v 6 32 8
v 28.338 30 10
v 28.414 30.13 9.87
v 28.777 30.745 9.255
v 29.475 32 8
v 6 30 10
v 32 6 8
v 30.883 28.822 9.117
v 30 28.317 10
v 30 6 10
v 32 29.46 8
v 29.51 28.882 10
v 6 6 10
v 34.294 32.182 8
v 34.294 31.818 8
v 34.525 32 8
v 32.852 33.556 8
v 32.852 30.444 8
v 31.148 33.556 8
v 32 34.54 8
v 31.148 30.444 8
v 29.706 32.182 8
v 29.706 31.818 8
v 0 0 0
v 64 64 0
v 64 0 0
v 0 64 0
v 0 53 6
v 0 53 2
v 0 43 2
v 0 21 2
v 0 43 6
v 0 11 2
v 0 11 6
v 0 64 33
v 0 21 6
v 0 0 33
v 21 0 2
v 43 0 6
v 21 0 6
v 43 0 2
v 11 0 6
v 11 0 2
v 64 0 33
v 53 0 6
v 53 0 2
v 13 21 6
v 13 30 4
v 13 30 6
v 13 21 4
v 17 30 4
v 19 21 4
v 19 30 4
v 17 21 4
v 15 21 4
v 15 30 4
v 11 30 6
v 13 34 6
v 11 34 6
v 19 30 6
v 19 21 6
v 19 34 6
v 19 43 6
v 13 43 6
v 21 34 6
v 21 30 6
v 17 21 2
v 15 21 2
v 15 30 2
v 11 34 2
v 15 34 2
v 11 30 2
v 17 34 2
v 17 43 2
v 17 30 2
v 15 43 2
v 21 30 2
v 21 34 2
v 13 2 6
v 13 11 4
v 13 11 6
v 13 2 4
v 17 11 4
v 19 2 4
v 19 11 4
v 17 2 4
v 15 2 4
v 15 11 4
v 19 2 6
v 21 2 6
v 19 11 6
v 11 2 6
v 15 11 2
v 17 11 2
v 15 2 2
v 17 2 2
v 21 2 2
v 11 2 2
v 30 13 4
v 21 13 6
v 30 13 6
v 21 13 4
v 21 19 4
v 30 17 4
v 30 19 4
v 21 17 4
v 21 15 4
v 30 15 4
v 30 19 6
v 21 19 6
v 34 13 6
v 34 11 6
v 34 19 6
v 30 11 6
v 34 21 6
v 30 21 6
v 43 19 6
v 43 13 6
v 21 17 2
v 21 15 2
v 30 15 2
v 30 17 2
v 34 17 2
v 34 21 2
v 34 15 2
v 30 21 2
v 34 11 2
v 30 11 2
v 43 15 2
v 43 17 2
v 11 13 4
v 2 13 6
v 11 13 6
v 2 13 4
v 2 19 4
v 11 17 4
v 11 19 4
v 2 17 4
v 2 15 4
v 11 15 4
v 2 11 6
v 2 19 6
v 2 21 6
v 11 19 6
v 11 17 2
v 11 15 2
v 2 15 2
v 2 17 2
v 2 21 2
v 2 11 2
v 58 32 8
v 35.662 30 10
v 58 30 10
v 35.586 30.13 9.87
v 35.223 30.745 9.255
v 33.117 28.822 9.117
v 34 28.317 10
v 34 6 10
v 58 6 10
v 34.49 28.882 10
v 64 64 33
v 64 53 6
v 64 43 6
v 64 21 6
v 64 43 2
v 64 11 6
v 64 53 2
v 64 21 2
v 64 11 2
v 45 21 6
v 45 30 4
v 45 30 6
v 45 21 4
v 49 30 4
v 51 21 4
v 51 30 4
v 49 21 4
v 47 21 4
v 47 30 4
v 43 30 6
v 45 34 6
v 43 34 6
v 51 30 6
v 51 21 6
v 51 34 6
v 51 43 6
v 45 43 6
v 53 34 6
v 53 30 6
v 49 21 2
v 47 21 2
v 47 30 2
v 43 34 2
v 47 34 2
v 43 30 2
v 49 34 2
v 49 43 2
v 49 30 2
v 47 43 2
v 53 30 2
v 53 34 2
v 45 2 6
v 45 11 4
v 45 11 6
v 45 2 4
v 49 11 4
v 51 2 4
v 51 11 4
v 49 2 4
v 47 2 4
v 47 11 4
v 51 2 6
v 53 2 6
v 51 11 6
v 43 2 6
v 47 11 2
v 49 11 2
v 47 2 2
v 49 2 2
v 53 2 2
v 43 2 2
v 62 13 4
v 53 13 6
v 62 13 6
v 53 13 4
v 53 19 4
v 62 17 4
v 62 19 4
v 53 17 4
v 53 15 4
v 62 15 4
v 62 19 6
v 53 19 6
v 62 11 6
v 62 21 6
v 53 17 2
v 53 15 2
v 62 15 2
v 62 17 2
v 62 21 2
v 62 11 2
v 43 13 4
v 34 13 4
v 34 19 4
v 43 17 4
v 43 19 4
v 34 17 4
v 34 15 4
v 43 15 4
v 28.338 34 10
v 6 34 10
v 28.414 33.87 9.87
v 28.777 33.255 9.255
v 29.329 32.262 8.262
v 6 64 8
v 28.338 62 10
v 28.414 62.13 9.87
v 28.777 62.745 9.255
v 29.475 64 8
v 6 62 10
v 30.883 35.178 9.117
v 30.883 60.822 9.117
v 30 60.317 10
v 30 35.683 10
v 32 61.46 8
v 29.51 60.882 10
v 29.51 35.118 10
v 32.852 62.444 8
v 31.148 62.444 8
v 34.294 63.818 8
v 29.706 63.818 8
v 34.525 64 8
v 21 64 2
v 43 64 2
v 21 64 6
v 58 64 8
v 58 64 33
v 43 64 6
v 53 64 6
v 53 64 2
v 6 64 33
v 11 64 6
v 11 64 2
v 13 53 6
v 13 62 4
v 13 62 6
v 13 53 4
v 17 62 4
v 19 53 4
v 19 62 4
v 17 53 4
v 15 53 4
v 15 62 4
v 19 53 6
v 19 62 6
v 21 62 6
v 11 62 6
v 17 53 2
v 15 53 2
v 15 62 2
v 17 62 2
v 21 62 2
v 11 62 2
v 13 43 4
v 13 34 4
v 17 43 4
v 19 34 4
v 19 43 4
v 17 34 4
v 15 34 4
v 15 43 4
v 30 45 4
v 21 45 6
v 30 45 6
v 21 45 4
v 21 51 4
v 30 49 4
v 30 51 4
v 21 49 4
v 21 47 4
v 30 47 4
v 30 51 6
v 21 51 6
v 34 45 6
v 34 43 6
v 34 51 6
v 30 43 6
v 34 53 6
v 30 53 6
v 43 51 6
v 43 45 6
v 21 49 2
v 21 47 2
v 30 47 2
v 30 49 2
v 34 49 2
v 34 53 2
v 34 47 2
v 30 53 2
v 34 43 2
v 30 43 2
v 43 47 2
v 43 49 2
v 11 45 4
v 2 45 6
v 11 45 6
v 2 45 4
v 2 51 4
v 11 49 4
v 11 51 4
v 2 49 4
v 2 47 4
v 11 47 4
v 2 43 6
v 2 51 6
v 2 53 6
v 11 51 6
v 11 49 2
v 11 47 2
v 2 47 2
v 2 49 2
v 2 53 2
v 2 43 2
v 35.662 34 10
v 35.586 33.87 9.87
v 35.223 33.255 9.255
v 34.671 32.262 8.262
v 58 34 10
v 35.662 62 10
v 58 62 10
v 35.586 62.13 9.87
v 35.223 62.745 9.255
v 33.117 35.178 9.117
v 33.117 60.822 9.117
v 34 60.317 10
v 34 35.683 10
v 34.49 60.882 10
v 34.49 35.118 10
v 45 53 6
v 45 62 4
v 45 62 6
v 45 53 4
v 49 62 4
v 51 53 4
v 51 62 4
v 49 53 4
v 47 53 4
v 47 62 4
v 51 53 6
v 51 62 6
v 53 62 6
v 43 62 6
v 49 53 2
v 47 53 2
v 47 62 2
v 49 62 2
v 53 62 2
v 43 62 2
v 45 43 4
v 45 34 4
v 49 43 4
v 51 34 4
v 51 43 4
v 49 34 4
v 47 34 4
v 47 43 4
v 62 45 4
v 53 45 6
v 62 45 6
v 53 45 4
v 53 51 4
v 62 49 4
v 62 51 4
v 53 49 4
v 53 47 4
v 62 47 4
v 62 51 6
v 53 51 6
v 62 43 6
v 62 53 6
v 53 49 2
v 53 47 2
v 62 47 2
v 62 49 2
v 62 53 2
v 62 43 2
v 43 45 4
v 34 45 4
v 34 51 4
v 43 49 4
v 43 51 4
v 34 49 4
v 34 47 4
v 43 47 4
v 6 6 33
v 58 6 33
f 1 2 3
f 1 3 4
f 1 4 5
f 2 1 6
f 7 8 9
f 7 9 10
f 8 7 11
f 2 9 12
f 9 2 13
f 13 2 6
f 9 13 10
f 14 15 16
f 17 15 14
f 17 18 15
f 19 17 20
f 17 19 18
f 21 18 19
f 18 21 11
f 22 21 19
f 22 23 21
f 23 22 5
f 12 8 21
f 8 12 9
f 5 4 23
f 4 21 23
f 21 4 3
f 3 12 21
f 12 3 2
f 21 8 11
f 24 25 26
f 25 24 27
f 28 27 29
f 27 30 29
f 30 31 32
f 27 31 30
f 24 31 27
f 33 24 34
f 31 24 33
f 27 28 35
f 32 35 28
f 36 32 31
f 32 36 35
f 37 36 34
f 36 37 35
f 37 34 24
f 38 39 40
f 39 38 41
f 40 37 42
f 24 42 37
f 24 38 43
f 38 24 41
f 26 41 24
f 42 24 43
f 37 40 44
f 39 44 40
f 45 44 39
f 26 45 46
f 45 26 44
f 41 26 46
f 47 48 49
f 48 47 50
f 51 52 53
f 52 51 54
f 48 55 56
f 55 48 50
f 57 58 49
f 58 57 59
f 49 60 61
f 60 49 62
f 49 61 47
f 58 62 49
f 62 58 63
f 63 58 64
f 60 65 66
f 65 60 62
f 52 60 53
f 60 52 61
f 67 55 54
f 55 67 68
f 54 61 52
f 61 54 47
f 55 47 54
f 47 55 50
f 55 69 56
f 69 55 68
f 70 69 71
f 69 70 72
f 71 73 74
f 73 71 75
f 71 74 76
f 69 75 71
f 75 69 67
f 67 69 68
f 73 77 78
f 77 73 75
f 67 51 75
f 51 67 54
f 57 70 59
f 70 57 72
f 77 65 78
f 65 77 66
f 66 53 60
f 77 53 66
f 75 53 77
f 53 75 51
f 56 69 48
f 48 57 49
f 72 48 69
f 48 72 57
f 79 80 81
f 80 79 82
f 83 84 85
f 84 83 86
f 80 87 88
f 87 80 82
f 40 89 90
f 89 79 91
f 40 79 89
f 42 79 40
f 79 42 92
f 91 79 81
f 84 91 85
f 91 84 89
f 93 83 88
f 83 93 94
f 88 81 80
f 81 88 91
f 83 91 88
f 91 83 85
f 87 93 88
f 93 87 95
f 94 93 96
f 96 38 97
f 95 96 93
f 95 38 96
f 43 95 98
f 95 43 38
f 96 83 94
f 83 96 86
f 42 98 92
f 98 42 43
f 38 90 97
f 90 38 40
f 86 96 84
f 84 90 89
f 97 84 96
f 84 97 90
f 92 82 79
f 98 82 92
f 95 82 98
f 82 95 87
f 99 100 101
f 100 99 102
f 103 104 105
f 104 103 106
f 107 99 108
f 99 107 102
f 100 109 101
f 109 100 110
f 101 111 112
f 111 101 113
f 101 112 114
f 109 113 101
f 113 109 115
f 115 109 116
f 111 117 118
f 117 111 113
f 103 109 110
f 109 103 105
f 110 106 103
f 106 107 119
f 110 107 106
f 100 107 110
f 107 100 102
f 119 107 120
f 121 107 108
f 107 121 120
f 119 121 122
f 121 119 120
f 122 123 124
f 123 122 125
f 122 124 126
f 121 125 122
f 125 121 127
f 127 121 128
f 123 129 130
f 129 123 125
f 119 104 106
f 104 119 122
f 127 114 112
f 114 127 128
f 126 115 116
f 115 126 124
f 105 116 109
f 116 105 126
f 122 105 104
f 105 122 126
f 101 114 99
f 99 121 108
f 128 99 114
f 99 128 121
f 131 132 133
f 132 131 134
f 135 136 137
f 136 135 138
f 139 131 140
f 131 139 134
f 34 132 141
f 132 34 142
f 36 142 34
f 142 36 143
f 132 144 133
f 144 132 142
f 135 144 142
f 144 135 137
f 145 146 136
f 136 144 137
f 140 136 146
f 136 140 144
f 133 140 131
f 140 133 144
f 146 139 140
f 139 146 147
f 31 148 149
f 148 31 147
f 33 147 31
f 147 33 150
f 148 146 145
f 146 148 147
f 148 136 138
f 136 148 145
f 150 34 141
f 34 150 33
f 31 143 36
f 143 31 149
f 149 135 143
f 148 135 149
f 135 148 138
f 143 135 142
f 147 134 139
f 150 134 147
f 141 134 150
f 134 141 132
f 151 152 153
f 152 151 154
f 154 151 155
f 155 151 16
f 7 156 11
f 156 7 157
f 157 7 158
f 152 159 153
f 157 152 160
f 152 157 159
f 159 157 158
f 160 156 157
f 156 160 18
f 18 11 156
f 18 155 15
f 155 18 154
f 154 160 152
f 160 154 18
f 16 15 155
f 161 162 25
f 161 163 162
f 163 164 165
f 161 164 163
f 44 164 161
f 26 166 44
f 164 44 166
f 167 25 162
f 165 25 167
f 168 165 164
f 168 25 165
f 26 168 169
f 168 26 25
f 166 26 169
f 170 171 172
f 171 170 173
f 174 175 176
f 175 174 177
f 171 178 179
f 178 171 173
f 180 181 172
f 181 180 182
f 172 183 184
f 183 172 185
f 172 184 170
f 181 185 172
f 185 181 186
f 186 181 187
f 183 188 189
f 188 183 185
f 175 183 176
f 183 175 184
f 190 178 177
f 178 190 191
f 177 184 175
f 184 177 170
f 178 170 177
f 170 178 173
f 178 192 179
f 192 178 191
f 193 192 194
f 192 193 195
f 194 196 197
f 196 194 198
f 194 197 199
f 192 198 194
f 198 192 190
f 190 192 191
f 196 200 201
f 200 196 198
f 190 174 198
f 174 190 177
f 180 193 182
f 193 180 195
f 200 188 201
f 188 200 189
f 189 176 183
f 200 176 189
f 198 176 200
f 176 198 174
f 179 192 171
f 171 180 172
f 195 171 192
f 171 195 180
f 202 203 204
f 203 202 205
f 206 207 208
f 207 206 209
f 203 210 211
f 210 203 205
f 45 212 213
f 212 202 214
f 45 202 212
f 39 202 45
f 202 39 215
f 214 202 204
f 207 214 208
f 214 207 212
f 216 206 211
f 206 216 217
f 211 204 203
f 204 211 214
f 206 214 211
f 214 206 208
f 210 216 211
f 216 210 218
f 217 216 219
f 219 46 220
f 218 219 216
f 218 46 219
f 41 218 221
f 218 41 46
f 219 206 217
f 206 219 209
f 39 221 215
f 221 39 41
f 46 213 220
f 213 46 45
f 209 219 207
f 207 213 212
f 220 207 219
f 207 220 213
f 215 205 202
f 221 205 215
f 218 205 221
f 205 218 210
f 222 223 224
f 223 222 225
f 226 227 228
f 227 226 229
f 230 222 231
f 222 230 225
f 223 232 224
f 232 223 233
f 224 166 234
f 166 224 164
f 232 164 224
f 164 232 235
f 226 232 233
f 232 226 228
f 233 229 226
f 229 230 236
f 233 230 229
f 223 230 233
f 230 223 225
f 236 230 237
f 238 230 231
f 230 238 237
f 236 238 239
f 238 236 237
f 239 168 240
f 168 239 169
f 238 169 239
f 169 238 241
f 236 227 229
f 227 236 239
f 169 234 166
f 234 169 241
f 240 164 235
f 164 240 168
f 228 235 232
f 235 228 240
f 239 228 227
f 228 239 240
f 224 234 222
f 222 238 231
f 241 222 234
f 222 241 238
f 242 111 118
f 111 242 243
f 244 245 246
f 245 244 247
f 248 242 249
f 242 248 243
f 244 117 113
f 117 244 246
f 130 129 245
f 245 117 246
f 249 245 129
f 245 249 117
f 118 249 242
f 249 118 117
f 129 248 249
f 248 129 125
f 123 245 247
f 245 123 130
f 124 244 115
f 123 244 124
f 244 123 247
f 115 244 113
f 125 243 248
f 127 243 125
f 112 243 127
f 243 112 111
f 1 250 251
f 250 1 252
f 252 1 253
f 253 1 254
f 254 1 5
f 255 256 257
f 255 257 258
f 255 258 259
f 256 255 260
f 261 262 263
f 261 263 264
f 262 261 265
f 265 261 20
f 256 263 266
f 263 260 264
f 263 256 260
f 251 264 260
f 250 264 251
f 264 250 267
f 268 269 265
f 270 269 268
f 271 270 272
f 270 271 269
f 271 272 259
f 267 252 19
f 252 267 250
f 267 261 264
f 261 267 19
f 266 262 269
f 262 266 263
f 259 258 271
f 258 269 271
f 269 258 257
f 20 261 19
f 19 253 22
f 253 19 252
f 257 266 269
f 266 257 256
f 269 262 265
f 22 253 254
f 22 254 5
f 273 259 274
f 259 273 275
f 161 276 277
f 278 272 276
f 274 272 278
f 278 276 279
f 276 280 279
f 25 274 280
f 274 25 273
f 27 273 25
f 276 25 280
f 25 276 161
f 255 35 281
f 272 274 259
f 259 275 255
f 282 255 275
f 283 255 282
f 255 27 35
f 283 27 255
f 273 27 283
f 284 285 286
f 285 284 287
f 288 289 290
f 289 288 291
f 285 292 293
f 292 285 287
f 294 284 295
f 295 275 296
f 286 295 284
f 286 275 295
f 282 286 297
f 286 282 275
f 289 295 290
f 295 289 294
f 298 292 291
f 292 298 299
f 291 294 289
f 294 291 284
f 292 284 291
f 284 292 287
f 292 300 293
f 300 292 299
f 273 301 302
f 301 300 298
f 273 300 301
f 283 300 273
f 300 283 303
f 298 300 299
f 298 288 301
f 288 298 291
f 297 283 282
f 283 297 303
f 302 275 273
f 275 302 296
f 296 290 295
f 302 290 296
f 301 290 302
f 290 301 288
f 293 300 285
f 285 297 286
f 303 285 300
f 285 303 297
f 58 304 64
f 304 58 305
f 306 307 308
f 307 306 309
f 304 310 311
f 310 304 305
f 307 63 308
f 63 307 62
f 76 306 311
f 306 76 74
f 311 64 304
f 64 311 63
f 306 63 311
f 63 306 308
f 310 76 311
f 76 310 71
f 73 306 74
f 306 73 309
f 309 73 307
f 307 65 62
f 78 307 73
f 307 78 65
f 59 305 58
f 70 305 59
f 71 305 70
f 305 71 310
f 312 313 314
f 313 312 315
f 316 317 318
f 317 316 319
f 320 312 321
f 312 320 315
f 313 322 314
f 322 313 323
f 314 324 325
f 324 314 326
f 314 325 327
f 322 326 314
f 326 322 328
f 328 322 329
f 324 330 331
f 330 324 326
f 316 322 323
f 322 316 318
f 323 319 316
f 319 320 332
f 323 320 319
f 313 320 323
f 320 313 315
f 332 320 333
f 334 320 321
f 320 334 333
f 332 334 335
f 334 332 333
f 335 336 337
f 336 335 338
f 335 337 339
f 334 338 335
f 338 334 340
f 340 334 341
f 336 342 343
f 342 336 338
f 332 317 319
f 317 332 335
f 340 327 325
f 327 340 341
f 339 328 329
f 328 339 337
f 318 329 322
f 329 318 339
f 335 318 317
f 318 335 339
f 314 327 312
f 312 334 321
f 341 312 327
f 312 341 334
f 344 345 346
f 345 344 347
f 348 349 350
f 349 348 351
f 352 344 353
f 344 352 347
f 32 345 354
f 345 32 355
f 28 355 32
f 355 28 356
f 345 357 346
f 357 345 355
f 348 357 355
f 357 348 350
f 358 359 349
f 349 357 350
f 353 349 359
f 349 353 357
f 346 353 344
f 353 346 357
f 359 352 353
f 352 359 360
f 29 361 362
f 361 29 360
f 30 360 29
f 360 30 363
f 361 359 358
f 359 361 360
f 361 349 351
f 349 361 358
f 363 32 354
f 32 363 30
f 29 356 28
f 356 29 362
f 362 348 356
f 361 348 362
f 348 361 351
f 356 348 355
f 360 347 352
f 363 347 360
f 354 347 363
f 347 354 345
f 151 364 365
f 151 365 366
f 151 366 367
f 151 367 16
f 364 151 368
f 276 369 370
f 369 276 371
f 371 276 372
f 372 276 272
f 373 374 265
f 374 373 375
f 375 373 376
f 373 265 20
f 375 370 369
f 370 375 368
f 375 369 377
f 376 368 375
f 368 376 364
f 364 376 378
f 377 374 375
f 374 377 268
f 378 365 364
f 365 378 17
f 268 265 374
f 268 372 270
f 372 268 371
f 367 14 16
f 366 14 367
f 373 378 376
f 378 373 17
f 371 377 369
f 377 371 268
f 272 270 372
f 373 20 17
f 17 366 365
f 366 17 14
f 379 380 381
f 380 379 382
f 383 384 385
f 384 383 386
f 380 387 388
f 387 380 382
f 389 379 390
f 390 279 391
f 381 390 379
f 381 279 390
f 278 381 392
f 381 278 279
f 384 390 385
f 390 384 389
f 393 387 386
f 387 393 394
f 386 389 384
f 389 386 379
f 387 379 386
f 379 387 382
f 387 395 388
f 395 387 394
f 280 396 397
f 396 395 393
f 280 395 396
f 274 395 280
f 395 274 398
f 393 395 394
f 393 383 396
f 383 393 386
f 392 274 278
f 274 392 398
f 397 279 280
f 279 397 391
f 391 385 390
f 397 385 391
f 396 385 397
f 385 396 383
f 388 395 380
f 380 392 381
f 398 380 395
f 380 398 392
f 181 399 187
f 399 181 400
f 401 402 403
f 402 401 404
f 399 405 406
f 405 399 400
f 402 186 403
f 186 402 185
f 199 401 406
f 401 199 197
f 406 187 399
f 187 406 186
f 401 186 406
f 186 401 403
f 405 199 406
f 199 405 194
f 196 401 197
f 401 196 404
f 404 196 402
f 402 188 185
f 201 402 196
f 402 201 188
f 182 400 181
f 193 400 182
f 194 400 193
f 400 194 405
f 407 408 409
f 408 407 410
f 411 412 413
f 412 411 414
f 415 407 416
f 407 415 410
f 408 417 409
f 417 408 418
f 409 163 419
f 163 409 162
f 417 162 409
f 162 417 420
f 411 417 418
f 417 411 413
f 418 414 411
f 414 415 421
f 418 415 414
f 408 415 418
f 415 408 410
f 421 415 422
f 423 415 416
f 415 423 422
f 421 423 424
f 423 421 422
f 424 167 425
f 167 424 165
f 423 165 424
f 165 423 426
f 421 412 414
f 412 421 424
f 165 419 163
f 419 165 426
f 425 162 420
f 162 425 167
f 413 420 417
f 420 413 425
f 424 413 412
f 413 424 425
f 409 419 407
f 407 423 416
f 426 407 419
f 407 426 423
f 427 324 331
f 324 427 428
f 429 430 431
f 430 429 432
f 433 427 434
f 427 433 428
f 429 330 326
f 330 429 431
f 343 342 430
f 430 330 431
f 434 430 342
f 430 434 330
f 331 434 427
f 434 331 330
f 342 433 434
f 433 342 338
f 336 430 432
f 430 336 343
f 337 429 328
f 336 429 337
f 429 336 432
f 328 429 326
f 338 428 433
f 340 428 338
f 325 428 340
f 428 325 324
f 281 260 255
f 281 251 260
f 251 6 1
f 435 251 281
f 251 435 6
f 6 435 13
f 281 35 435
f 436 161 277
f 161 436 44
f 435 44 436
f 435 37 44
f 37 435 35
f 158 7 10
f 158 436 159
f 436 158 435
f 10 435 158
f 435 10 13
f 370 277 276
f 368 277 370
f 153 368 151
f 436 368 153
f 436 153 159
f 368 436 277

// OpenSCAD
// file: ModularDungeonTileLibrary.scad
//Constants
wallleft = 0;
wallbottom = 1;
wallright = 2;
walltop = 3;
wallcenter = 4;
walldoubleright = 5;


//Variables
size = 32;
connectorlength = size-10;
connectorwidth = 6;
connectorheight = 4;
baseheight = 8;
topperheight = 2;
topperrounded = true;
walllength = size;
wallheight = 25;
wallwidth = 6;
wallwidththin = 4;


//Functions
function hypotenuse_ra(side_a, side_b) =
    sqrt(pow(side_a, 2) + pow(side_b, 2));
    
    
//Modules    
module mtdl_Base_Connector(cw,cl,ch) {
    translate([-connectorwidth/2,-connectorlength/2,-connectorheight/2]) {
        cube([cw,cl,ch/2]);
        translate([cw/3,0,ch/2])
            cube([cw/3,cl,ch/2]);
        translate([-(cw-2)/2,cl/2-2,0])
            cube([cw+4,4,ch]);
    }
}

module mdtl_Base(s,bh)
{
    cube([s,s,bh]);
}

module mdtl_Topper(s,bh,th,tr)
{
    if (tr) {
        translate([0,0,bh])
            intersection() {
                difference () {
                        cube([s,s,th]);
                        union () {
                        rotate(a=45, v=[1,0,0])
                            cube([s,th*2,th*2]);
                        translate([0,s,0])
                            rotate(a=45, v=[1,0,0])
                                cube([s,th*2,th*2]);
                        rotate(a=-45, v=[0,1,0])
                            cube([th*2,s,th*2]);
                        translate([s,0,0])
                            rotate(a=-45, v=[0,1,0])
                                cube([th*2,s,th*2]);
                        }
                }
                translate([s/2,s/2,0])
                    cylinder(
                        h=th, 
                        r1=hypotenuse_ra(s/2-1.2, s/2-1.2), 
                        r2=hypotenuse_ra(s/2-th-.8, s/2-th-.8), 
                        center=false, 
                        $fa=.1);
            }    
    }
    else {
        translate([0,0,bh])
            difference() {
                cube([s,s,th]);
                union () {
                rotate(a=45, v=[1,0,0])
                    cube([s,th*2,th*2]);
                translate([0,s,0])
                    rotate(a=45, v=[1,0,0])
                        cube([s,th*2,th*2]);
                rotate(a=-45, v=[0,1,0])
                    cube([th*2,s,th*2]);
                translate([s,0,0])
                    rotate(a=-45, v=[0,1,0])
                        cube([th*2,s,th*2]);
                }
            }    
    }
}

module mdtl_Base_1x1(s,bh,th,tr) 
{
    difference () {
        union () {
            mdtl_Base(s,bh);
            mdtl_Topper(s,bh,th,tr);
        }
        union () {
            translate([size/2,size,baseheight/2])
                rotate([0,180,0])
                    mtdl_Base_Connector(connectorwidth,connectorlength,connectorheight);
            translate([size/2,0,baseheight/2])
                rotate([0,180,0])
                    mtdl_Base_Connector(connectorwidth,connectorlength,connectorheight);
            translate([size,size/2,baseheight/2])
                rotate([0,180,90])
                    mtdl_Base_Connector(connectorwidth,connectorlength,connectorheight);
            translate([0,size/2,baseheight/2])
                rotate([0,180,90])
                    mtdl_Base_Connector(connectorwidth,connectorlength,connectorheight);
        }
    }
}

module mdtl_Base_1x2(s,bh,th,tr)
{
    union () {
        mdtl_Base_1x1(s,bh,th,tr);
        translate([s,0,0])
            mdtl_Base_1x1(s,bh,th,tr);
    }
}
 
module mdtl_Base_2x2(s,bh,th,tr)
{
    union () {
        mdtl_Base_1x2(s,bh,th,tr);
        translate([0,s,0])
            mdtl_Base_1x2(s,bh,th,tr);
    }
}
 
module mdtl_Base_2x4(s,bh,th,tr)
{
    union () {
        mdtl_Base_2x2(s,bh,th,tr);
        translate([s*2,0,0])
            mdtl_Base_2x2(s,bh,th,tr);
    }
}
 
module mdtl_Base_4x4(s,bh,th,tr)
{
    union () {
        mdtl_Base_2x4(s,bh,th,tr);
        translate([0,s*2,0])
            mdtl_Base_2x4(s,bh,th,tr);
    }
}
 
module mdtl_Wall_1(w,l,h)
{
    translate([0,0,baseheight])
        cube([w,l,h]);   
}

module mdtl_Wall_1_Position(w,l,h,p)
{
    if (p==0) {
        mdtl_Wall_1(w,l,h);
    }
    
    else if (p==1) {
        rotate(a=-90)
           translate([-w,0,0])
               mdtl_Wall_1(w,l,h);       
    }
    
    else if (p==2) {
        translate([(size)-w,0,0])
            mdtl_Wall_1(w,l,h);
    }
    
    else if (p==3) {
        rotate(a=-90)
            translate([-l,0,0])
                mdtl_Wall_1(w,l,h);
    }
    
    else if (p==4) {
        translate([(size)-w/2,0,0])
            mdtl_Wall_1(w,l,h);
    }
    
    else if (p==5) {
        translate([(size*2)-w,0,0])
           mdtl_Wall_1(w,l,h);       
    }
}

module mdtl_Wall_2(w,l,h)
{
    union() {
        mdtl_Wall_1(w,l,h);
        translate([0,l,0])
            mdtl_Wall_1(w,l,h);
    }
}

module mdtl_Wall_2_Position(w,l,h,p)
{
    if (p==0) {
        mdtl_Wall_2(w,l,h);
    }
    
    else if (p==1) {
        rotate(a=-90)
            translate([-w,0,0])
                mdtl_Wall_2(w,l,h);
    }
    
    else if (p==2) {
    translate([(size*2)-w,0,0])
        mdtl_Wall_2(w,l,h);
    }
    
    else if (p==3) {
        rotate(a=-90)
            translate([-l*2,0,0])
                mdtl_Wall_2(w,l,h);
    }
    
    else if (p==4) {
        translate([(size)-w/2,0,0])
            mdtl_Wall_2(w,l,h);
    }
}
// main file
include <ModularDungeonTileLibrary.scad>; 
 
mdtl_Base_2x2(size,baseheight,topperheight,topperrounded);
mdtl_Wall_2_Position(wallwidth,walllength,wallheight,wallleft);
mdtl_Wall_2_Position(wallwidth,walllength,wallheight,wallbottom);
mdtl_Wall_2_Position(wallwidth,walllength,wallheight,wallright);
